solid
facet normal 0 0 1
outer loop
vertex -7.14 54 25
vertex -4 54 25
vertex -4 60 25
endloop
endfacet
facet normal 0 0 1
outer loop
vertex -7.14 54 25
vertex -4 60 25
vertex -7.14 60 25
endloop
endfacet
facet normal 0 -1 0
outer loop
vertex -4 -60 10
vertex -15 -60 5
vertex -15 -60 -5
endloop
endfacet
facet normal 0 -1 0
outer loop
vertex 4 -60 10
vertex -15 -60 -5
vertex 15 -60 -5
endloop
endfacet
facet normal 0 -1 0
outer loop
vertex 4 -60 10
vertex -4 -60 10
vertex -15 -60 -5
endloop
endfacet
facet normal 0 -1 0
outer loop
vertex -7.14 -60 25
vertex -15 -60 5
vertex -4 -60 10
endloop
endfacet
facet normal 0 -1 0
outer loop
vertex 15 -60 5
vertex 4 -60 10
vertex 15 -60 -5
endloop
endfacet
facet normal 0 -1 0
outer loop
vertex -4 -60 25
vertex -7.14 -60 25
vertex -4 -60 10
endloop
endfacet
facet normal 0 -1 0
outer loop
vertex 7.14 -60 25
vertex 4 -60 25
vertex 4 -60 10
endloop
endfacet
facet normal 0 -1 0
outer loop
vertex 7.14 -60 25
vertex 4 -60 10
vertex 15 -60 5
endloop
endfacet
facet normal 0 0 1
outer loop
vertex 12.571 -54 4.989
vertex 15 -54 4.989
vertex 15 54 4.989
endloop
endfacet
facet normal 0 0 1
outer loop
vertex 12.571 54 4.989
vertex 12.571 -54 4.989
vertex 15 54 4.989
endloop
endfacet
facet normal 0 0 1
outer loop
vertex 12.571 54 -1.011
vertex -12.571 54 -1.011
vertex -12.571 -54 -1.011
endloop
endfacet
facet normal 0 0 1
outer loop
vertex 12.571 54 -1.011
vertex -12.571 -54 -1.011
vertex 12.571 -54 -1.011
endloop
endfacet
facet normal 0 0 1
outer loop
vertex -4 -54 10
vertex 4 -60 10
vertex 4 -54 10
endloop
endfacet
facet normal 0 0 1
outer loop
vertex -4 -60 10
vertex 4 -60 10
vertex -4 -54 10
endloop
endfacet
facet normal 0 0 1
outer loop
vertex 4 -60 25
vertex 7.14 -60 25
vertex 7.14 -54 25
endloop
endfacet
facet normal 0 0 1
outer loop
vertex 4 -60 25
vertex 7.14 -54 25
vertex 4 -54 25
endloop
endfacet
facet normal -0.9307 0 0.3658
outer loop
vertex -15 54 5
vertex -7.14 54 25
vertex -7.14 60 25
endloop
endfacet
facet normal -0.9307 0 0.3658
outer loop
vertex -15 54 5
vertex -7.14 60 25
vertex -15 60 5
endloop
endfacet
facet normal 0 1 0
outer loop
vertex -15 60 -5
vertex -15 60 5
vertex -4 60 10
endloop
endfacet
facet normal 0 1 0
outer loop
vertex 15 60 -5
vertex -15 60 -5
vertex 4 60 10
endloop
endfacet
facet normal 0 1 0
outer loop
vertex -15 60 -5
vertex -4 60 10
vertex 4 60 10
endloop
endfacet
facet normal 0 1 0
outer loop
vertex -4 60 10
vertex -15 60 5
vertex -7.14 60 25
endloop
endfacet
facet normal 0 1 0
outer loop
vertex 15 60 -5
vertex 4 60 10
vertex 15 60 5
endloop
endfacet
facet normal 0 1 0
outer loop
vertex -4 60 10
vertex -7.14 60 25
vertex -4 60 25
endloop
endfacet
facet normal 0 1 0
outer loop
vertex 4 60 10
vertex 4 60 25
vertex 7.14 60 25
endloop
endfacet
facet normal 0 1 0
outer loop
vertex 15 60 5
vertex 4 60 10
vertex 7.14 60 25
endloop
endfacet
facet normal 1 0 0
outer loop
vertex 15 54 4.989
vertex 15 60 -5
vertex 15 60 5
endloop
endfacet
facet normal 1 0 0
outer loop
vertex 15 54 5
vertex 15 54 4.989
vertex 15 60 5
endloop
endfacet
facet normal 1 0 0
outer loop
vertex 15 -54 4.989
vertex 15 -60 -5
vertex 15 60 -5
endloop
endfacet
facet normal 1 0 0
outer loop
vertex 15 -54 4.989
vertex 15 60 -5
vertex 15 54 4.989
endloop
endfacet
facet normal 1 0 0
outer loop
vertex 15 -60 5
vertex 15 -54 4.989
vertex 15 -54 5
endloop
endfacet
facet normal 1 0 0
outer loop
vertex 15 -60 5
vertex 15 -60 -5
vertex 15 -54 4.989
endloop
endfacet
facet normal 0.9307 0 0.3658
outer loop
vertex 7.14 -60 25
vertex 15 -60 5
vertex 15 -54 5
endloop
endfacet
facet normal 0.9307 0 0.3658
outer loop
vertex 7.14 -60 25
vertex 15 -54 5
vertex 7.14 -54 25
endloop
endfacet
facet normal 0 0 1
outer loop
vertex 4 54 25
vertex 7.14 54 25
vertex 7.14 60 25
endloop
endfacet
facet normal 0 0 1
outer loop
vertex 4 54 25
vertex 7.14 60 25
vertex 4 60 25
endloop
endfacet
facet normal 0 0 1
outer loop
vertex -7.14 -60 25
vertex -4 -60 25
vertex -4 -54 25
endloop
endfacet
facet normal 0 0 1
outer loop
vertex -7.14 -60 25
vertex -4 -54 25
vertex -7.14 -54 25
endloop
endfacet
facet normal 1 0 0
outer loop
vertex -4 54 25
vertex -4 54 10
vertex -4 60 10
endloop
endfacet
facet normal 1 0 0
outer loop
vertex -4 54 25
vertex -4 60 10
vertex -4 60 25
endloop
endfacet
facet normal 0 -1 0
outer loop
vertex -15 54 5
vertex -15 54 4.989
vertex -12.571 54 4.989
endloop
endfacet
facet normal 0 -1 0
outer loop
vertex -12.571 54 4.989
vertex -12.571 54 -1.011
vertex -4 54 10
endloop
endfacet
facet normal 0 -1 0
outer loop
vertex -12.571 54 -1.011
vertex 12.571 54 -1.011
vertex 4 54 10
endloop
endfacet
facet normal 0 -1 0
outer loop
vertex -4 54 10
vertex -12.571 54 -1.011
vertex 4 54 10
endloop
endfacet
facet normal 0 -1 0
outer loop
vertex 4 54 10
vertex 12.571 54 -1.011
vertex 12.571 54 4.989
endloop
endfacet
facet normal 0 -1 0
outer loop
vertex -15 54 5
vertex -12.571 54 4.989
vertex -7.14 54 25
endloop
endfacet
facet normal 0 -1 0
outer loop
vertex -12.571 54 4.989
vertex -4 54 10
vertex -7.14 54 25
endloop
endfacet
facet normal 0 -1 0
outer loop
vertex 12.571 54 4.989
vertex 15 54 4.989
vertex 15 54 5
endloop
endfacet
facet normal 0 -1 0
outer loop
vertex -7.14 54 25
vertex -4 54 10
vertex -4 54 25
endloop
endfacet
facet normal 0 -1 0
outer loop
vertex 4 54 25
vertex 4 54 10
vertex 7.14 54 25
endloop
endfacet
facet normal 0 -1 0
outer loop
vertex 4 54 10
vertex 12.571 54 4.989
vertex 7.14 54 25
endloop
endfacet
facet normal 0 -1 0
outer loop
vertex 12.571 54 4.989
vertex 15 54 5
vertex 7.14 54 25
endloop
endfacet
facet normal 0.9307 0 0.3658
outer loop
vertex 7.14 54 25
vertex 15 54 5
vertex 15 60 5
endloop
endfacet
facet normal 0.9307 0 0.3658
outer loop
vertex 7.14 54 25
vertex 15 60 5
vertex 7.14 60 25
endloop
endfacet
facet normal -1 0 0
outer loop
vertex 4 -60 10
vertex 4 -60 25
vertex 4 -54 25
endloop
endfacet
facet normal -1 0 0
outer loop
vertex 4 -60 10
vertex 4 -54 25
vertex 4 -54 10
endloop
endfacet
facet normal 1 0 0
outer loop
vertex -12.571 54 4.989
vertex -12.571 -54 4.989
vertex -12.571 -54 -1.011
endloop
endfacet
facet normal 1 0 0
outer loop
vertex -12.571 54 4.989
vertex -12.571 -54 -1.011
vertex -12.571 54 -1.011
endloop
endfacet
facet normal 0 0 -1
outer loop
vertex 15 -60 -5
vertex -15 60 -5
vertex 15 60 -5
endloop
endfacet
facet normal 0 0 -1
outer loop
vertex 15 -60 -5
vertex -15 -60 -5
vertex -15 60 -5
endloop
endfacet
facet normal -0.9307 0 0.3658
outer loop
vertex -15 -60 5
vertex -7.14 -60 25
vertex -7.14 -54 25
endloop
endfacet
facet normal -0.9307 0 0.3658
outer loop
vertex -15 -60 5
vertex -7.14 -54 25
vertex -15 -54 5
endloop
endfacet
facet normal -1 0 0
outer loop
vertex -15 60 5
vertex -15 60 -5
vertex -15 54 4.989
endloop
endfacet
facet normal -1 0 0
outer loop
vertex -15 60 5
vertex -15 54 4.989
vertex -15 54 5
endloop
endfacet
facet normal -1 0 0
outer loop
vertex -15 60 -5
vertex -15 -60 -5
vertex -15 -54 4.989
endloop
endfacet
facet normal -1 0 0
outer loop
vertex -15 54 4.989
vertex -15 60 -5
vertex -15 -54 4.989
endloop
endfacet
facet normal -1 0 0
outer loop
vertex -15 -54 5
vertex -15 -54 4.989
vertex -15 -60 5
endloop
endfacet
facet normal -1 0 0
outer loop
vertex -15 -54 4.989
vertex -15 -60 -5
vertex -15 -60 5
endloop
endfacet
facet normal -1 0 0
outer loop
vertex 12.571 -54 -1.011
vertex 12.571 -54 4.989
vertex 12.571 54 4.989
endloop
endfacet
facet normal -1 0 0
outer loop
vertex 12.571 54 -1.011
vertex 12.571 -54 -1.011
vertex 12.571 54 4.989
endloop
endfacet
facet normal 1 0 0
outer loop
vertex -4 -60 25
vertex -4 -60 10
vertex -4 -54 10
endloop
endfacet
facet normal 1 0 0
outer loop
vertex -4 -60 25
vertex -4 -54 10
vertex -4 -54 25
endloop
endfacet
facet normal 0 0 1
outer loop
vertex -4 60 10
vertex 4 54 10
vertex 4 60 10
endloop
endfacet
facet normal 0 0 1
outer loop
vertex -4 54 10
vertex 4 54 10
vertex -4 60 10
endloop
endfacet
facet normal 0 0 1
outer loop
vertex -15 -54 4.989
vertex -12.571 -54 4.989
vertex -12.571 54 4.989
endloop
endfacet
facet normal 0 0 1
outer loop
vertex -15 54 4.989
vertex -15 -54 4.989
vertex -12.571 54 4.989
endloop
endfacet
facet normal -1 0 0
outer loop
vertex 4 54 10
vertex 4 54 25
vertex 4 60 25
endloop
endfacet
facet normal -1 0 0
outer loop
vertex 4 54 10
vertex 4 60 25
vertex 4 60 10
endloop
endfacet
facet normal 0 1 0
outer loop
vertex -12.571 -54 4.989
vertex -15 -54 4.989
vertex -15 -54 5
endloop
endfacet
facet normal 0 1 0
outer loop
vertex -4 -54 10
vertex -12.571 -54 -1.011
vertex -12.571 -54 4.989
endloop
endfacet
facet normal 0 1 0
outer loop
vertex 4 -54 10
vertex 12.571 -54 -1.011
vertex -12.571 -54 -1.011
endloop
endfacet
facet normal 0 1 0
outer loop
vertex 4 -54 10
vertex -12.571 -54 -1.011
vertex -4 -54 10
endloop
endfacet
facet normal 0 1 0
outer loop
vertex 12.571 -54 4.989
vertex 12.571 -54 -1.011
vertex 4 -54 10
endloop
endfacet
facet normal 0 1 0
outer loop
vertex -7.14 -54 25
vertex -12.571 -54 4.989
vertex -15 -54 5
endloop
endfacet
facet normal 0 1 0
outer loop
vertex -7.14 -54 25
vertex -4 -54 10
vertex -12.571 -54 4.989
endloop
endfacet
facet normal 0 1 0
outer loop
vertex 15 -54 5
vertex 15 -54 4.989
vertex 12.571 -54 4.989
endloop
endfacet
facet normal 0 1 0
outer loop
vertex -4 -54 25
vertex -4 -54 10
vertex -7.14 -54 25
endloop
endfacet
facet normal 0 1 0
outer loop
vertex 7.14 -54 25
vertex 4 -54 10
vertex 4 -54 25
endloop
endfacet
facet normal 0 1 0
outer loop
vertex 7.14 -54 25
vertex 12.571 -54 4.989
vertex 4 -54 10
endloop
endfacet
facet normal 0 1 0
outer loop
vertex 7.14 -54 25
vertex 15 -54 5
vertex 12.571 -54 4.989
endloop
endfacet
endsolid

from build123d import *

# Parameters (mm, degrees)
F0_W     = 30
F0_H     = 10
F1_DEPTH = 60
F2_W     = 108
F2_H     = 39.921402
F3_DEPTH = 150
F4_W     = 25.141022
F4_H     = 108
F5_DEPTH = 6


with BuildPart() as f1:
    # F0 (on Front) → F1 (new body, symmetric)
    with BuildSketch(Plane.XZ):
        Polygon((-15, 5), (15, 5), (7.140478, 25), (4, 25), (4, 10), (-4, 10), (-4, 25), (-7.140478, 25), align=None)
        Rectangle(F0_W, F0_H)
    extrude(amount=F1_DEPTH, both=True)

    # F2 (on Right) → F3 (cut, symmetric)
    with BuildSketch(Plane.YZ):
        with Locations((0, 24.950191)):
            Rectangle(F2_W, F2_H)
    extrude(amount=F3_DEPTH, both=True, mode=Mode.SUBTRACT)

    # F4 (on face) → F5 (cut)
    with BuildSketch(Plane.XY.offset(4.98949)):
        Rectangle(F4_W, F4_H)
    extrude(amount=-F5_DEPTH, mode=Mode.SUBTRACT)


solid = f1.part
